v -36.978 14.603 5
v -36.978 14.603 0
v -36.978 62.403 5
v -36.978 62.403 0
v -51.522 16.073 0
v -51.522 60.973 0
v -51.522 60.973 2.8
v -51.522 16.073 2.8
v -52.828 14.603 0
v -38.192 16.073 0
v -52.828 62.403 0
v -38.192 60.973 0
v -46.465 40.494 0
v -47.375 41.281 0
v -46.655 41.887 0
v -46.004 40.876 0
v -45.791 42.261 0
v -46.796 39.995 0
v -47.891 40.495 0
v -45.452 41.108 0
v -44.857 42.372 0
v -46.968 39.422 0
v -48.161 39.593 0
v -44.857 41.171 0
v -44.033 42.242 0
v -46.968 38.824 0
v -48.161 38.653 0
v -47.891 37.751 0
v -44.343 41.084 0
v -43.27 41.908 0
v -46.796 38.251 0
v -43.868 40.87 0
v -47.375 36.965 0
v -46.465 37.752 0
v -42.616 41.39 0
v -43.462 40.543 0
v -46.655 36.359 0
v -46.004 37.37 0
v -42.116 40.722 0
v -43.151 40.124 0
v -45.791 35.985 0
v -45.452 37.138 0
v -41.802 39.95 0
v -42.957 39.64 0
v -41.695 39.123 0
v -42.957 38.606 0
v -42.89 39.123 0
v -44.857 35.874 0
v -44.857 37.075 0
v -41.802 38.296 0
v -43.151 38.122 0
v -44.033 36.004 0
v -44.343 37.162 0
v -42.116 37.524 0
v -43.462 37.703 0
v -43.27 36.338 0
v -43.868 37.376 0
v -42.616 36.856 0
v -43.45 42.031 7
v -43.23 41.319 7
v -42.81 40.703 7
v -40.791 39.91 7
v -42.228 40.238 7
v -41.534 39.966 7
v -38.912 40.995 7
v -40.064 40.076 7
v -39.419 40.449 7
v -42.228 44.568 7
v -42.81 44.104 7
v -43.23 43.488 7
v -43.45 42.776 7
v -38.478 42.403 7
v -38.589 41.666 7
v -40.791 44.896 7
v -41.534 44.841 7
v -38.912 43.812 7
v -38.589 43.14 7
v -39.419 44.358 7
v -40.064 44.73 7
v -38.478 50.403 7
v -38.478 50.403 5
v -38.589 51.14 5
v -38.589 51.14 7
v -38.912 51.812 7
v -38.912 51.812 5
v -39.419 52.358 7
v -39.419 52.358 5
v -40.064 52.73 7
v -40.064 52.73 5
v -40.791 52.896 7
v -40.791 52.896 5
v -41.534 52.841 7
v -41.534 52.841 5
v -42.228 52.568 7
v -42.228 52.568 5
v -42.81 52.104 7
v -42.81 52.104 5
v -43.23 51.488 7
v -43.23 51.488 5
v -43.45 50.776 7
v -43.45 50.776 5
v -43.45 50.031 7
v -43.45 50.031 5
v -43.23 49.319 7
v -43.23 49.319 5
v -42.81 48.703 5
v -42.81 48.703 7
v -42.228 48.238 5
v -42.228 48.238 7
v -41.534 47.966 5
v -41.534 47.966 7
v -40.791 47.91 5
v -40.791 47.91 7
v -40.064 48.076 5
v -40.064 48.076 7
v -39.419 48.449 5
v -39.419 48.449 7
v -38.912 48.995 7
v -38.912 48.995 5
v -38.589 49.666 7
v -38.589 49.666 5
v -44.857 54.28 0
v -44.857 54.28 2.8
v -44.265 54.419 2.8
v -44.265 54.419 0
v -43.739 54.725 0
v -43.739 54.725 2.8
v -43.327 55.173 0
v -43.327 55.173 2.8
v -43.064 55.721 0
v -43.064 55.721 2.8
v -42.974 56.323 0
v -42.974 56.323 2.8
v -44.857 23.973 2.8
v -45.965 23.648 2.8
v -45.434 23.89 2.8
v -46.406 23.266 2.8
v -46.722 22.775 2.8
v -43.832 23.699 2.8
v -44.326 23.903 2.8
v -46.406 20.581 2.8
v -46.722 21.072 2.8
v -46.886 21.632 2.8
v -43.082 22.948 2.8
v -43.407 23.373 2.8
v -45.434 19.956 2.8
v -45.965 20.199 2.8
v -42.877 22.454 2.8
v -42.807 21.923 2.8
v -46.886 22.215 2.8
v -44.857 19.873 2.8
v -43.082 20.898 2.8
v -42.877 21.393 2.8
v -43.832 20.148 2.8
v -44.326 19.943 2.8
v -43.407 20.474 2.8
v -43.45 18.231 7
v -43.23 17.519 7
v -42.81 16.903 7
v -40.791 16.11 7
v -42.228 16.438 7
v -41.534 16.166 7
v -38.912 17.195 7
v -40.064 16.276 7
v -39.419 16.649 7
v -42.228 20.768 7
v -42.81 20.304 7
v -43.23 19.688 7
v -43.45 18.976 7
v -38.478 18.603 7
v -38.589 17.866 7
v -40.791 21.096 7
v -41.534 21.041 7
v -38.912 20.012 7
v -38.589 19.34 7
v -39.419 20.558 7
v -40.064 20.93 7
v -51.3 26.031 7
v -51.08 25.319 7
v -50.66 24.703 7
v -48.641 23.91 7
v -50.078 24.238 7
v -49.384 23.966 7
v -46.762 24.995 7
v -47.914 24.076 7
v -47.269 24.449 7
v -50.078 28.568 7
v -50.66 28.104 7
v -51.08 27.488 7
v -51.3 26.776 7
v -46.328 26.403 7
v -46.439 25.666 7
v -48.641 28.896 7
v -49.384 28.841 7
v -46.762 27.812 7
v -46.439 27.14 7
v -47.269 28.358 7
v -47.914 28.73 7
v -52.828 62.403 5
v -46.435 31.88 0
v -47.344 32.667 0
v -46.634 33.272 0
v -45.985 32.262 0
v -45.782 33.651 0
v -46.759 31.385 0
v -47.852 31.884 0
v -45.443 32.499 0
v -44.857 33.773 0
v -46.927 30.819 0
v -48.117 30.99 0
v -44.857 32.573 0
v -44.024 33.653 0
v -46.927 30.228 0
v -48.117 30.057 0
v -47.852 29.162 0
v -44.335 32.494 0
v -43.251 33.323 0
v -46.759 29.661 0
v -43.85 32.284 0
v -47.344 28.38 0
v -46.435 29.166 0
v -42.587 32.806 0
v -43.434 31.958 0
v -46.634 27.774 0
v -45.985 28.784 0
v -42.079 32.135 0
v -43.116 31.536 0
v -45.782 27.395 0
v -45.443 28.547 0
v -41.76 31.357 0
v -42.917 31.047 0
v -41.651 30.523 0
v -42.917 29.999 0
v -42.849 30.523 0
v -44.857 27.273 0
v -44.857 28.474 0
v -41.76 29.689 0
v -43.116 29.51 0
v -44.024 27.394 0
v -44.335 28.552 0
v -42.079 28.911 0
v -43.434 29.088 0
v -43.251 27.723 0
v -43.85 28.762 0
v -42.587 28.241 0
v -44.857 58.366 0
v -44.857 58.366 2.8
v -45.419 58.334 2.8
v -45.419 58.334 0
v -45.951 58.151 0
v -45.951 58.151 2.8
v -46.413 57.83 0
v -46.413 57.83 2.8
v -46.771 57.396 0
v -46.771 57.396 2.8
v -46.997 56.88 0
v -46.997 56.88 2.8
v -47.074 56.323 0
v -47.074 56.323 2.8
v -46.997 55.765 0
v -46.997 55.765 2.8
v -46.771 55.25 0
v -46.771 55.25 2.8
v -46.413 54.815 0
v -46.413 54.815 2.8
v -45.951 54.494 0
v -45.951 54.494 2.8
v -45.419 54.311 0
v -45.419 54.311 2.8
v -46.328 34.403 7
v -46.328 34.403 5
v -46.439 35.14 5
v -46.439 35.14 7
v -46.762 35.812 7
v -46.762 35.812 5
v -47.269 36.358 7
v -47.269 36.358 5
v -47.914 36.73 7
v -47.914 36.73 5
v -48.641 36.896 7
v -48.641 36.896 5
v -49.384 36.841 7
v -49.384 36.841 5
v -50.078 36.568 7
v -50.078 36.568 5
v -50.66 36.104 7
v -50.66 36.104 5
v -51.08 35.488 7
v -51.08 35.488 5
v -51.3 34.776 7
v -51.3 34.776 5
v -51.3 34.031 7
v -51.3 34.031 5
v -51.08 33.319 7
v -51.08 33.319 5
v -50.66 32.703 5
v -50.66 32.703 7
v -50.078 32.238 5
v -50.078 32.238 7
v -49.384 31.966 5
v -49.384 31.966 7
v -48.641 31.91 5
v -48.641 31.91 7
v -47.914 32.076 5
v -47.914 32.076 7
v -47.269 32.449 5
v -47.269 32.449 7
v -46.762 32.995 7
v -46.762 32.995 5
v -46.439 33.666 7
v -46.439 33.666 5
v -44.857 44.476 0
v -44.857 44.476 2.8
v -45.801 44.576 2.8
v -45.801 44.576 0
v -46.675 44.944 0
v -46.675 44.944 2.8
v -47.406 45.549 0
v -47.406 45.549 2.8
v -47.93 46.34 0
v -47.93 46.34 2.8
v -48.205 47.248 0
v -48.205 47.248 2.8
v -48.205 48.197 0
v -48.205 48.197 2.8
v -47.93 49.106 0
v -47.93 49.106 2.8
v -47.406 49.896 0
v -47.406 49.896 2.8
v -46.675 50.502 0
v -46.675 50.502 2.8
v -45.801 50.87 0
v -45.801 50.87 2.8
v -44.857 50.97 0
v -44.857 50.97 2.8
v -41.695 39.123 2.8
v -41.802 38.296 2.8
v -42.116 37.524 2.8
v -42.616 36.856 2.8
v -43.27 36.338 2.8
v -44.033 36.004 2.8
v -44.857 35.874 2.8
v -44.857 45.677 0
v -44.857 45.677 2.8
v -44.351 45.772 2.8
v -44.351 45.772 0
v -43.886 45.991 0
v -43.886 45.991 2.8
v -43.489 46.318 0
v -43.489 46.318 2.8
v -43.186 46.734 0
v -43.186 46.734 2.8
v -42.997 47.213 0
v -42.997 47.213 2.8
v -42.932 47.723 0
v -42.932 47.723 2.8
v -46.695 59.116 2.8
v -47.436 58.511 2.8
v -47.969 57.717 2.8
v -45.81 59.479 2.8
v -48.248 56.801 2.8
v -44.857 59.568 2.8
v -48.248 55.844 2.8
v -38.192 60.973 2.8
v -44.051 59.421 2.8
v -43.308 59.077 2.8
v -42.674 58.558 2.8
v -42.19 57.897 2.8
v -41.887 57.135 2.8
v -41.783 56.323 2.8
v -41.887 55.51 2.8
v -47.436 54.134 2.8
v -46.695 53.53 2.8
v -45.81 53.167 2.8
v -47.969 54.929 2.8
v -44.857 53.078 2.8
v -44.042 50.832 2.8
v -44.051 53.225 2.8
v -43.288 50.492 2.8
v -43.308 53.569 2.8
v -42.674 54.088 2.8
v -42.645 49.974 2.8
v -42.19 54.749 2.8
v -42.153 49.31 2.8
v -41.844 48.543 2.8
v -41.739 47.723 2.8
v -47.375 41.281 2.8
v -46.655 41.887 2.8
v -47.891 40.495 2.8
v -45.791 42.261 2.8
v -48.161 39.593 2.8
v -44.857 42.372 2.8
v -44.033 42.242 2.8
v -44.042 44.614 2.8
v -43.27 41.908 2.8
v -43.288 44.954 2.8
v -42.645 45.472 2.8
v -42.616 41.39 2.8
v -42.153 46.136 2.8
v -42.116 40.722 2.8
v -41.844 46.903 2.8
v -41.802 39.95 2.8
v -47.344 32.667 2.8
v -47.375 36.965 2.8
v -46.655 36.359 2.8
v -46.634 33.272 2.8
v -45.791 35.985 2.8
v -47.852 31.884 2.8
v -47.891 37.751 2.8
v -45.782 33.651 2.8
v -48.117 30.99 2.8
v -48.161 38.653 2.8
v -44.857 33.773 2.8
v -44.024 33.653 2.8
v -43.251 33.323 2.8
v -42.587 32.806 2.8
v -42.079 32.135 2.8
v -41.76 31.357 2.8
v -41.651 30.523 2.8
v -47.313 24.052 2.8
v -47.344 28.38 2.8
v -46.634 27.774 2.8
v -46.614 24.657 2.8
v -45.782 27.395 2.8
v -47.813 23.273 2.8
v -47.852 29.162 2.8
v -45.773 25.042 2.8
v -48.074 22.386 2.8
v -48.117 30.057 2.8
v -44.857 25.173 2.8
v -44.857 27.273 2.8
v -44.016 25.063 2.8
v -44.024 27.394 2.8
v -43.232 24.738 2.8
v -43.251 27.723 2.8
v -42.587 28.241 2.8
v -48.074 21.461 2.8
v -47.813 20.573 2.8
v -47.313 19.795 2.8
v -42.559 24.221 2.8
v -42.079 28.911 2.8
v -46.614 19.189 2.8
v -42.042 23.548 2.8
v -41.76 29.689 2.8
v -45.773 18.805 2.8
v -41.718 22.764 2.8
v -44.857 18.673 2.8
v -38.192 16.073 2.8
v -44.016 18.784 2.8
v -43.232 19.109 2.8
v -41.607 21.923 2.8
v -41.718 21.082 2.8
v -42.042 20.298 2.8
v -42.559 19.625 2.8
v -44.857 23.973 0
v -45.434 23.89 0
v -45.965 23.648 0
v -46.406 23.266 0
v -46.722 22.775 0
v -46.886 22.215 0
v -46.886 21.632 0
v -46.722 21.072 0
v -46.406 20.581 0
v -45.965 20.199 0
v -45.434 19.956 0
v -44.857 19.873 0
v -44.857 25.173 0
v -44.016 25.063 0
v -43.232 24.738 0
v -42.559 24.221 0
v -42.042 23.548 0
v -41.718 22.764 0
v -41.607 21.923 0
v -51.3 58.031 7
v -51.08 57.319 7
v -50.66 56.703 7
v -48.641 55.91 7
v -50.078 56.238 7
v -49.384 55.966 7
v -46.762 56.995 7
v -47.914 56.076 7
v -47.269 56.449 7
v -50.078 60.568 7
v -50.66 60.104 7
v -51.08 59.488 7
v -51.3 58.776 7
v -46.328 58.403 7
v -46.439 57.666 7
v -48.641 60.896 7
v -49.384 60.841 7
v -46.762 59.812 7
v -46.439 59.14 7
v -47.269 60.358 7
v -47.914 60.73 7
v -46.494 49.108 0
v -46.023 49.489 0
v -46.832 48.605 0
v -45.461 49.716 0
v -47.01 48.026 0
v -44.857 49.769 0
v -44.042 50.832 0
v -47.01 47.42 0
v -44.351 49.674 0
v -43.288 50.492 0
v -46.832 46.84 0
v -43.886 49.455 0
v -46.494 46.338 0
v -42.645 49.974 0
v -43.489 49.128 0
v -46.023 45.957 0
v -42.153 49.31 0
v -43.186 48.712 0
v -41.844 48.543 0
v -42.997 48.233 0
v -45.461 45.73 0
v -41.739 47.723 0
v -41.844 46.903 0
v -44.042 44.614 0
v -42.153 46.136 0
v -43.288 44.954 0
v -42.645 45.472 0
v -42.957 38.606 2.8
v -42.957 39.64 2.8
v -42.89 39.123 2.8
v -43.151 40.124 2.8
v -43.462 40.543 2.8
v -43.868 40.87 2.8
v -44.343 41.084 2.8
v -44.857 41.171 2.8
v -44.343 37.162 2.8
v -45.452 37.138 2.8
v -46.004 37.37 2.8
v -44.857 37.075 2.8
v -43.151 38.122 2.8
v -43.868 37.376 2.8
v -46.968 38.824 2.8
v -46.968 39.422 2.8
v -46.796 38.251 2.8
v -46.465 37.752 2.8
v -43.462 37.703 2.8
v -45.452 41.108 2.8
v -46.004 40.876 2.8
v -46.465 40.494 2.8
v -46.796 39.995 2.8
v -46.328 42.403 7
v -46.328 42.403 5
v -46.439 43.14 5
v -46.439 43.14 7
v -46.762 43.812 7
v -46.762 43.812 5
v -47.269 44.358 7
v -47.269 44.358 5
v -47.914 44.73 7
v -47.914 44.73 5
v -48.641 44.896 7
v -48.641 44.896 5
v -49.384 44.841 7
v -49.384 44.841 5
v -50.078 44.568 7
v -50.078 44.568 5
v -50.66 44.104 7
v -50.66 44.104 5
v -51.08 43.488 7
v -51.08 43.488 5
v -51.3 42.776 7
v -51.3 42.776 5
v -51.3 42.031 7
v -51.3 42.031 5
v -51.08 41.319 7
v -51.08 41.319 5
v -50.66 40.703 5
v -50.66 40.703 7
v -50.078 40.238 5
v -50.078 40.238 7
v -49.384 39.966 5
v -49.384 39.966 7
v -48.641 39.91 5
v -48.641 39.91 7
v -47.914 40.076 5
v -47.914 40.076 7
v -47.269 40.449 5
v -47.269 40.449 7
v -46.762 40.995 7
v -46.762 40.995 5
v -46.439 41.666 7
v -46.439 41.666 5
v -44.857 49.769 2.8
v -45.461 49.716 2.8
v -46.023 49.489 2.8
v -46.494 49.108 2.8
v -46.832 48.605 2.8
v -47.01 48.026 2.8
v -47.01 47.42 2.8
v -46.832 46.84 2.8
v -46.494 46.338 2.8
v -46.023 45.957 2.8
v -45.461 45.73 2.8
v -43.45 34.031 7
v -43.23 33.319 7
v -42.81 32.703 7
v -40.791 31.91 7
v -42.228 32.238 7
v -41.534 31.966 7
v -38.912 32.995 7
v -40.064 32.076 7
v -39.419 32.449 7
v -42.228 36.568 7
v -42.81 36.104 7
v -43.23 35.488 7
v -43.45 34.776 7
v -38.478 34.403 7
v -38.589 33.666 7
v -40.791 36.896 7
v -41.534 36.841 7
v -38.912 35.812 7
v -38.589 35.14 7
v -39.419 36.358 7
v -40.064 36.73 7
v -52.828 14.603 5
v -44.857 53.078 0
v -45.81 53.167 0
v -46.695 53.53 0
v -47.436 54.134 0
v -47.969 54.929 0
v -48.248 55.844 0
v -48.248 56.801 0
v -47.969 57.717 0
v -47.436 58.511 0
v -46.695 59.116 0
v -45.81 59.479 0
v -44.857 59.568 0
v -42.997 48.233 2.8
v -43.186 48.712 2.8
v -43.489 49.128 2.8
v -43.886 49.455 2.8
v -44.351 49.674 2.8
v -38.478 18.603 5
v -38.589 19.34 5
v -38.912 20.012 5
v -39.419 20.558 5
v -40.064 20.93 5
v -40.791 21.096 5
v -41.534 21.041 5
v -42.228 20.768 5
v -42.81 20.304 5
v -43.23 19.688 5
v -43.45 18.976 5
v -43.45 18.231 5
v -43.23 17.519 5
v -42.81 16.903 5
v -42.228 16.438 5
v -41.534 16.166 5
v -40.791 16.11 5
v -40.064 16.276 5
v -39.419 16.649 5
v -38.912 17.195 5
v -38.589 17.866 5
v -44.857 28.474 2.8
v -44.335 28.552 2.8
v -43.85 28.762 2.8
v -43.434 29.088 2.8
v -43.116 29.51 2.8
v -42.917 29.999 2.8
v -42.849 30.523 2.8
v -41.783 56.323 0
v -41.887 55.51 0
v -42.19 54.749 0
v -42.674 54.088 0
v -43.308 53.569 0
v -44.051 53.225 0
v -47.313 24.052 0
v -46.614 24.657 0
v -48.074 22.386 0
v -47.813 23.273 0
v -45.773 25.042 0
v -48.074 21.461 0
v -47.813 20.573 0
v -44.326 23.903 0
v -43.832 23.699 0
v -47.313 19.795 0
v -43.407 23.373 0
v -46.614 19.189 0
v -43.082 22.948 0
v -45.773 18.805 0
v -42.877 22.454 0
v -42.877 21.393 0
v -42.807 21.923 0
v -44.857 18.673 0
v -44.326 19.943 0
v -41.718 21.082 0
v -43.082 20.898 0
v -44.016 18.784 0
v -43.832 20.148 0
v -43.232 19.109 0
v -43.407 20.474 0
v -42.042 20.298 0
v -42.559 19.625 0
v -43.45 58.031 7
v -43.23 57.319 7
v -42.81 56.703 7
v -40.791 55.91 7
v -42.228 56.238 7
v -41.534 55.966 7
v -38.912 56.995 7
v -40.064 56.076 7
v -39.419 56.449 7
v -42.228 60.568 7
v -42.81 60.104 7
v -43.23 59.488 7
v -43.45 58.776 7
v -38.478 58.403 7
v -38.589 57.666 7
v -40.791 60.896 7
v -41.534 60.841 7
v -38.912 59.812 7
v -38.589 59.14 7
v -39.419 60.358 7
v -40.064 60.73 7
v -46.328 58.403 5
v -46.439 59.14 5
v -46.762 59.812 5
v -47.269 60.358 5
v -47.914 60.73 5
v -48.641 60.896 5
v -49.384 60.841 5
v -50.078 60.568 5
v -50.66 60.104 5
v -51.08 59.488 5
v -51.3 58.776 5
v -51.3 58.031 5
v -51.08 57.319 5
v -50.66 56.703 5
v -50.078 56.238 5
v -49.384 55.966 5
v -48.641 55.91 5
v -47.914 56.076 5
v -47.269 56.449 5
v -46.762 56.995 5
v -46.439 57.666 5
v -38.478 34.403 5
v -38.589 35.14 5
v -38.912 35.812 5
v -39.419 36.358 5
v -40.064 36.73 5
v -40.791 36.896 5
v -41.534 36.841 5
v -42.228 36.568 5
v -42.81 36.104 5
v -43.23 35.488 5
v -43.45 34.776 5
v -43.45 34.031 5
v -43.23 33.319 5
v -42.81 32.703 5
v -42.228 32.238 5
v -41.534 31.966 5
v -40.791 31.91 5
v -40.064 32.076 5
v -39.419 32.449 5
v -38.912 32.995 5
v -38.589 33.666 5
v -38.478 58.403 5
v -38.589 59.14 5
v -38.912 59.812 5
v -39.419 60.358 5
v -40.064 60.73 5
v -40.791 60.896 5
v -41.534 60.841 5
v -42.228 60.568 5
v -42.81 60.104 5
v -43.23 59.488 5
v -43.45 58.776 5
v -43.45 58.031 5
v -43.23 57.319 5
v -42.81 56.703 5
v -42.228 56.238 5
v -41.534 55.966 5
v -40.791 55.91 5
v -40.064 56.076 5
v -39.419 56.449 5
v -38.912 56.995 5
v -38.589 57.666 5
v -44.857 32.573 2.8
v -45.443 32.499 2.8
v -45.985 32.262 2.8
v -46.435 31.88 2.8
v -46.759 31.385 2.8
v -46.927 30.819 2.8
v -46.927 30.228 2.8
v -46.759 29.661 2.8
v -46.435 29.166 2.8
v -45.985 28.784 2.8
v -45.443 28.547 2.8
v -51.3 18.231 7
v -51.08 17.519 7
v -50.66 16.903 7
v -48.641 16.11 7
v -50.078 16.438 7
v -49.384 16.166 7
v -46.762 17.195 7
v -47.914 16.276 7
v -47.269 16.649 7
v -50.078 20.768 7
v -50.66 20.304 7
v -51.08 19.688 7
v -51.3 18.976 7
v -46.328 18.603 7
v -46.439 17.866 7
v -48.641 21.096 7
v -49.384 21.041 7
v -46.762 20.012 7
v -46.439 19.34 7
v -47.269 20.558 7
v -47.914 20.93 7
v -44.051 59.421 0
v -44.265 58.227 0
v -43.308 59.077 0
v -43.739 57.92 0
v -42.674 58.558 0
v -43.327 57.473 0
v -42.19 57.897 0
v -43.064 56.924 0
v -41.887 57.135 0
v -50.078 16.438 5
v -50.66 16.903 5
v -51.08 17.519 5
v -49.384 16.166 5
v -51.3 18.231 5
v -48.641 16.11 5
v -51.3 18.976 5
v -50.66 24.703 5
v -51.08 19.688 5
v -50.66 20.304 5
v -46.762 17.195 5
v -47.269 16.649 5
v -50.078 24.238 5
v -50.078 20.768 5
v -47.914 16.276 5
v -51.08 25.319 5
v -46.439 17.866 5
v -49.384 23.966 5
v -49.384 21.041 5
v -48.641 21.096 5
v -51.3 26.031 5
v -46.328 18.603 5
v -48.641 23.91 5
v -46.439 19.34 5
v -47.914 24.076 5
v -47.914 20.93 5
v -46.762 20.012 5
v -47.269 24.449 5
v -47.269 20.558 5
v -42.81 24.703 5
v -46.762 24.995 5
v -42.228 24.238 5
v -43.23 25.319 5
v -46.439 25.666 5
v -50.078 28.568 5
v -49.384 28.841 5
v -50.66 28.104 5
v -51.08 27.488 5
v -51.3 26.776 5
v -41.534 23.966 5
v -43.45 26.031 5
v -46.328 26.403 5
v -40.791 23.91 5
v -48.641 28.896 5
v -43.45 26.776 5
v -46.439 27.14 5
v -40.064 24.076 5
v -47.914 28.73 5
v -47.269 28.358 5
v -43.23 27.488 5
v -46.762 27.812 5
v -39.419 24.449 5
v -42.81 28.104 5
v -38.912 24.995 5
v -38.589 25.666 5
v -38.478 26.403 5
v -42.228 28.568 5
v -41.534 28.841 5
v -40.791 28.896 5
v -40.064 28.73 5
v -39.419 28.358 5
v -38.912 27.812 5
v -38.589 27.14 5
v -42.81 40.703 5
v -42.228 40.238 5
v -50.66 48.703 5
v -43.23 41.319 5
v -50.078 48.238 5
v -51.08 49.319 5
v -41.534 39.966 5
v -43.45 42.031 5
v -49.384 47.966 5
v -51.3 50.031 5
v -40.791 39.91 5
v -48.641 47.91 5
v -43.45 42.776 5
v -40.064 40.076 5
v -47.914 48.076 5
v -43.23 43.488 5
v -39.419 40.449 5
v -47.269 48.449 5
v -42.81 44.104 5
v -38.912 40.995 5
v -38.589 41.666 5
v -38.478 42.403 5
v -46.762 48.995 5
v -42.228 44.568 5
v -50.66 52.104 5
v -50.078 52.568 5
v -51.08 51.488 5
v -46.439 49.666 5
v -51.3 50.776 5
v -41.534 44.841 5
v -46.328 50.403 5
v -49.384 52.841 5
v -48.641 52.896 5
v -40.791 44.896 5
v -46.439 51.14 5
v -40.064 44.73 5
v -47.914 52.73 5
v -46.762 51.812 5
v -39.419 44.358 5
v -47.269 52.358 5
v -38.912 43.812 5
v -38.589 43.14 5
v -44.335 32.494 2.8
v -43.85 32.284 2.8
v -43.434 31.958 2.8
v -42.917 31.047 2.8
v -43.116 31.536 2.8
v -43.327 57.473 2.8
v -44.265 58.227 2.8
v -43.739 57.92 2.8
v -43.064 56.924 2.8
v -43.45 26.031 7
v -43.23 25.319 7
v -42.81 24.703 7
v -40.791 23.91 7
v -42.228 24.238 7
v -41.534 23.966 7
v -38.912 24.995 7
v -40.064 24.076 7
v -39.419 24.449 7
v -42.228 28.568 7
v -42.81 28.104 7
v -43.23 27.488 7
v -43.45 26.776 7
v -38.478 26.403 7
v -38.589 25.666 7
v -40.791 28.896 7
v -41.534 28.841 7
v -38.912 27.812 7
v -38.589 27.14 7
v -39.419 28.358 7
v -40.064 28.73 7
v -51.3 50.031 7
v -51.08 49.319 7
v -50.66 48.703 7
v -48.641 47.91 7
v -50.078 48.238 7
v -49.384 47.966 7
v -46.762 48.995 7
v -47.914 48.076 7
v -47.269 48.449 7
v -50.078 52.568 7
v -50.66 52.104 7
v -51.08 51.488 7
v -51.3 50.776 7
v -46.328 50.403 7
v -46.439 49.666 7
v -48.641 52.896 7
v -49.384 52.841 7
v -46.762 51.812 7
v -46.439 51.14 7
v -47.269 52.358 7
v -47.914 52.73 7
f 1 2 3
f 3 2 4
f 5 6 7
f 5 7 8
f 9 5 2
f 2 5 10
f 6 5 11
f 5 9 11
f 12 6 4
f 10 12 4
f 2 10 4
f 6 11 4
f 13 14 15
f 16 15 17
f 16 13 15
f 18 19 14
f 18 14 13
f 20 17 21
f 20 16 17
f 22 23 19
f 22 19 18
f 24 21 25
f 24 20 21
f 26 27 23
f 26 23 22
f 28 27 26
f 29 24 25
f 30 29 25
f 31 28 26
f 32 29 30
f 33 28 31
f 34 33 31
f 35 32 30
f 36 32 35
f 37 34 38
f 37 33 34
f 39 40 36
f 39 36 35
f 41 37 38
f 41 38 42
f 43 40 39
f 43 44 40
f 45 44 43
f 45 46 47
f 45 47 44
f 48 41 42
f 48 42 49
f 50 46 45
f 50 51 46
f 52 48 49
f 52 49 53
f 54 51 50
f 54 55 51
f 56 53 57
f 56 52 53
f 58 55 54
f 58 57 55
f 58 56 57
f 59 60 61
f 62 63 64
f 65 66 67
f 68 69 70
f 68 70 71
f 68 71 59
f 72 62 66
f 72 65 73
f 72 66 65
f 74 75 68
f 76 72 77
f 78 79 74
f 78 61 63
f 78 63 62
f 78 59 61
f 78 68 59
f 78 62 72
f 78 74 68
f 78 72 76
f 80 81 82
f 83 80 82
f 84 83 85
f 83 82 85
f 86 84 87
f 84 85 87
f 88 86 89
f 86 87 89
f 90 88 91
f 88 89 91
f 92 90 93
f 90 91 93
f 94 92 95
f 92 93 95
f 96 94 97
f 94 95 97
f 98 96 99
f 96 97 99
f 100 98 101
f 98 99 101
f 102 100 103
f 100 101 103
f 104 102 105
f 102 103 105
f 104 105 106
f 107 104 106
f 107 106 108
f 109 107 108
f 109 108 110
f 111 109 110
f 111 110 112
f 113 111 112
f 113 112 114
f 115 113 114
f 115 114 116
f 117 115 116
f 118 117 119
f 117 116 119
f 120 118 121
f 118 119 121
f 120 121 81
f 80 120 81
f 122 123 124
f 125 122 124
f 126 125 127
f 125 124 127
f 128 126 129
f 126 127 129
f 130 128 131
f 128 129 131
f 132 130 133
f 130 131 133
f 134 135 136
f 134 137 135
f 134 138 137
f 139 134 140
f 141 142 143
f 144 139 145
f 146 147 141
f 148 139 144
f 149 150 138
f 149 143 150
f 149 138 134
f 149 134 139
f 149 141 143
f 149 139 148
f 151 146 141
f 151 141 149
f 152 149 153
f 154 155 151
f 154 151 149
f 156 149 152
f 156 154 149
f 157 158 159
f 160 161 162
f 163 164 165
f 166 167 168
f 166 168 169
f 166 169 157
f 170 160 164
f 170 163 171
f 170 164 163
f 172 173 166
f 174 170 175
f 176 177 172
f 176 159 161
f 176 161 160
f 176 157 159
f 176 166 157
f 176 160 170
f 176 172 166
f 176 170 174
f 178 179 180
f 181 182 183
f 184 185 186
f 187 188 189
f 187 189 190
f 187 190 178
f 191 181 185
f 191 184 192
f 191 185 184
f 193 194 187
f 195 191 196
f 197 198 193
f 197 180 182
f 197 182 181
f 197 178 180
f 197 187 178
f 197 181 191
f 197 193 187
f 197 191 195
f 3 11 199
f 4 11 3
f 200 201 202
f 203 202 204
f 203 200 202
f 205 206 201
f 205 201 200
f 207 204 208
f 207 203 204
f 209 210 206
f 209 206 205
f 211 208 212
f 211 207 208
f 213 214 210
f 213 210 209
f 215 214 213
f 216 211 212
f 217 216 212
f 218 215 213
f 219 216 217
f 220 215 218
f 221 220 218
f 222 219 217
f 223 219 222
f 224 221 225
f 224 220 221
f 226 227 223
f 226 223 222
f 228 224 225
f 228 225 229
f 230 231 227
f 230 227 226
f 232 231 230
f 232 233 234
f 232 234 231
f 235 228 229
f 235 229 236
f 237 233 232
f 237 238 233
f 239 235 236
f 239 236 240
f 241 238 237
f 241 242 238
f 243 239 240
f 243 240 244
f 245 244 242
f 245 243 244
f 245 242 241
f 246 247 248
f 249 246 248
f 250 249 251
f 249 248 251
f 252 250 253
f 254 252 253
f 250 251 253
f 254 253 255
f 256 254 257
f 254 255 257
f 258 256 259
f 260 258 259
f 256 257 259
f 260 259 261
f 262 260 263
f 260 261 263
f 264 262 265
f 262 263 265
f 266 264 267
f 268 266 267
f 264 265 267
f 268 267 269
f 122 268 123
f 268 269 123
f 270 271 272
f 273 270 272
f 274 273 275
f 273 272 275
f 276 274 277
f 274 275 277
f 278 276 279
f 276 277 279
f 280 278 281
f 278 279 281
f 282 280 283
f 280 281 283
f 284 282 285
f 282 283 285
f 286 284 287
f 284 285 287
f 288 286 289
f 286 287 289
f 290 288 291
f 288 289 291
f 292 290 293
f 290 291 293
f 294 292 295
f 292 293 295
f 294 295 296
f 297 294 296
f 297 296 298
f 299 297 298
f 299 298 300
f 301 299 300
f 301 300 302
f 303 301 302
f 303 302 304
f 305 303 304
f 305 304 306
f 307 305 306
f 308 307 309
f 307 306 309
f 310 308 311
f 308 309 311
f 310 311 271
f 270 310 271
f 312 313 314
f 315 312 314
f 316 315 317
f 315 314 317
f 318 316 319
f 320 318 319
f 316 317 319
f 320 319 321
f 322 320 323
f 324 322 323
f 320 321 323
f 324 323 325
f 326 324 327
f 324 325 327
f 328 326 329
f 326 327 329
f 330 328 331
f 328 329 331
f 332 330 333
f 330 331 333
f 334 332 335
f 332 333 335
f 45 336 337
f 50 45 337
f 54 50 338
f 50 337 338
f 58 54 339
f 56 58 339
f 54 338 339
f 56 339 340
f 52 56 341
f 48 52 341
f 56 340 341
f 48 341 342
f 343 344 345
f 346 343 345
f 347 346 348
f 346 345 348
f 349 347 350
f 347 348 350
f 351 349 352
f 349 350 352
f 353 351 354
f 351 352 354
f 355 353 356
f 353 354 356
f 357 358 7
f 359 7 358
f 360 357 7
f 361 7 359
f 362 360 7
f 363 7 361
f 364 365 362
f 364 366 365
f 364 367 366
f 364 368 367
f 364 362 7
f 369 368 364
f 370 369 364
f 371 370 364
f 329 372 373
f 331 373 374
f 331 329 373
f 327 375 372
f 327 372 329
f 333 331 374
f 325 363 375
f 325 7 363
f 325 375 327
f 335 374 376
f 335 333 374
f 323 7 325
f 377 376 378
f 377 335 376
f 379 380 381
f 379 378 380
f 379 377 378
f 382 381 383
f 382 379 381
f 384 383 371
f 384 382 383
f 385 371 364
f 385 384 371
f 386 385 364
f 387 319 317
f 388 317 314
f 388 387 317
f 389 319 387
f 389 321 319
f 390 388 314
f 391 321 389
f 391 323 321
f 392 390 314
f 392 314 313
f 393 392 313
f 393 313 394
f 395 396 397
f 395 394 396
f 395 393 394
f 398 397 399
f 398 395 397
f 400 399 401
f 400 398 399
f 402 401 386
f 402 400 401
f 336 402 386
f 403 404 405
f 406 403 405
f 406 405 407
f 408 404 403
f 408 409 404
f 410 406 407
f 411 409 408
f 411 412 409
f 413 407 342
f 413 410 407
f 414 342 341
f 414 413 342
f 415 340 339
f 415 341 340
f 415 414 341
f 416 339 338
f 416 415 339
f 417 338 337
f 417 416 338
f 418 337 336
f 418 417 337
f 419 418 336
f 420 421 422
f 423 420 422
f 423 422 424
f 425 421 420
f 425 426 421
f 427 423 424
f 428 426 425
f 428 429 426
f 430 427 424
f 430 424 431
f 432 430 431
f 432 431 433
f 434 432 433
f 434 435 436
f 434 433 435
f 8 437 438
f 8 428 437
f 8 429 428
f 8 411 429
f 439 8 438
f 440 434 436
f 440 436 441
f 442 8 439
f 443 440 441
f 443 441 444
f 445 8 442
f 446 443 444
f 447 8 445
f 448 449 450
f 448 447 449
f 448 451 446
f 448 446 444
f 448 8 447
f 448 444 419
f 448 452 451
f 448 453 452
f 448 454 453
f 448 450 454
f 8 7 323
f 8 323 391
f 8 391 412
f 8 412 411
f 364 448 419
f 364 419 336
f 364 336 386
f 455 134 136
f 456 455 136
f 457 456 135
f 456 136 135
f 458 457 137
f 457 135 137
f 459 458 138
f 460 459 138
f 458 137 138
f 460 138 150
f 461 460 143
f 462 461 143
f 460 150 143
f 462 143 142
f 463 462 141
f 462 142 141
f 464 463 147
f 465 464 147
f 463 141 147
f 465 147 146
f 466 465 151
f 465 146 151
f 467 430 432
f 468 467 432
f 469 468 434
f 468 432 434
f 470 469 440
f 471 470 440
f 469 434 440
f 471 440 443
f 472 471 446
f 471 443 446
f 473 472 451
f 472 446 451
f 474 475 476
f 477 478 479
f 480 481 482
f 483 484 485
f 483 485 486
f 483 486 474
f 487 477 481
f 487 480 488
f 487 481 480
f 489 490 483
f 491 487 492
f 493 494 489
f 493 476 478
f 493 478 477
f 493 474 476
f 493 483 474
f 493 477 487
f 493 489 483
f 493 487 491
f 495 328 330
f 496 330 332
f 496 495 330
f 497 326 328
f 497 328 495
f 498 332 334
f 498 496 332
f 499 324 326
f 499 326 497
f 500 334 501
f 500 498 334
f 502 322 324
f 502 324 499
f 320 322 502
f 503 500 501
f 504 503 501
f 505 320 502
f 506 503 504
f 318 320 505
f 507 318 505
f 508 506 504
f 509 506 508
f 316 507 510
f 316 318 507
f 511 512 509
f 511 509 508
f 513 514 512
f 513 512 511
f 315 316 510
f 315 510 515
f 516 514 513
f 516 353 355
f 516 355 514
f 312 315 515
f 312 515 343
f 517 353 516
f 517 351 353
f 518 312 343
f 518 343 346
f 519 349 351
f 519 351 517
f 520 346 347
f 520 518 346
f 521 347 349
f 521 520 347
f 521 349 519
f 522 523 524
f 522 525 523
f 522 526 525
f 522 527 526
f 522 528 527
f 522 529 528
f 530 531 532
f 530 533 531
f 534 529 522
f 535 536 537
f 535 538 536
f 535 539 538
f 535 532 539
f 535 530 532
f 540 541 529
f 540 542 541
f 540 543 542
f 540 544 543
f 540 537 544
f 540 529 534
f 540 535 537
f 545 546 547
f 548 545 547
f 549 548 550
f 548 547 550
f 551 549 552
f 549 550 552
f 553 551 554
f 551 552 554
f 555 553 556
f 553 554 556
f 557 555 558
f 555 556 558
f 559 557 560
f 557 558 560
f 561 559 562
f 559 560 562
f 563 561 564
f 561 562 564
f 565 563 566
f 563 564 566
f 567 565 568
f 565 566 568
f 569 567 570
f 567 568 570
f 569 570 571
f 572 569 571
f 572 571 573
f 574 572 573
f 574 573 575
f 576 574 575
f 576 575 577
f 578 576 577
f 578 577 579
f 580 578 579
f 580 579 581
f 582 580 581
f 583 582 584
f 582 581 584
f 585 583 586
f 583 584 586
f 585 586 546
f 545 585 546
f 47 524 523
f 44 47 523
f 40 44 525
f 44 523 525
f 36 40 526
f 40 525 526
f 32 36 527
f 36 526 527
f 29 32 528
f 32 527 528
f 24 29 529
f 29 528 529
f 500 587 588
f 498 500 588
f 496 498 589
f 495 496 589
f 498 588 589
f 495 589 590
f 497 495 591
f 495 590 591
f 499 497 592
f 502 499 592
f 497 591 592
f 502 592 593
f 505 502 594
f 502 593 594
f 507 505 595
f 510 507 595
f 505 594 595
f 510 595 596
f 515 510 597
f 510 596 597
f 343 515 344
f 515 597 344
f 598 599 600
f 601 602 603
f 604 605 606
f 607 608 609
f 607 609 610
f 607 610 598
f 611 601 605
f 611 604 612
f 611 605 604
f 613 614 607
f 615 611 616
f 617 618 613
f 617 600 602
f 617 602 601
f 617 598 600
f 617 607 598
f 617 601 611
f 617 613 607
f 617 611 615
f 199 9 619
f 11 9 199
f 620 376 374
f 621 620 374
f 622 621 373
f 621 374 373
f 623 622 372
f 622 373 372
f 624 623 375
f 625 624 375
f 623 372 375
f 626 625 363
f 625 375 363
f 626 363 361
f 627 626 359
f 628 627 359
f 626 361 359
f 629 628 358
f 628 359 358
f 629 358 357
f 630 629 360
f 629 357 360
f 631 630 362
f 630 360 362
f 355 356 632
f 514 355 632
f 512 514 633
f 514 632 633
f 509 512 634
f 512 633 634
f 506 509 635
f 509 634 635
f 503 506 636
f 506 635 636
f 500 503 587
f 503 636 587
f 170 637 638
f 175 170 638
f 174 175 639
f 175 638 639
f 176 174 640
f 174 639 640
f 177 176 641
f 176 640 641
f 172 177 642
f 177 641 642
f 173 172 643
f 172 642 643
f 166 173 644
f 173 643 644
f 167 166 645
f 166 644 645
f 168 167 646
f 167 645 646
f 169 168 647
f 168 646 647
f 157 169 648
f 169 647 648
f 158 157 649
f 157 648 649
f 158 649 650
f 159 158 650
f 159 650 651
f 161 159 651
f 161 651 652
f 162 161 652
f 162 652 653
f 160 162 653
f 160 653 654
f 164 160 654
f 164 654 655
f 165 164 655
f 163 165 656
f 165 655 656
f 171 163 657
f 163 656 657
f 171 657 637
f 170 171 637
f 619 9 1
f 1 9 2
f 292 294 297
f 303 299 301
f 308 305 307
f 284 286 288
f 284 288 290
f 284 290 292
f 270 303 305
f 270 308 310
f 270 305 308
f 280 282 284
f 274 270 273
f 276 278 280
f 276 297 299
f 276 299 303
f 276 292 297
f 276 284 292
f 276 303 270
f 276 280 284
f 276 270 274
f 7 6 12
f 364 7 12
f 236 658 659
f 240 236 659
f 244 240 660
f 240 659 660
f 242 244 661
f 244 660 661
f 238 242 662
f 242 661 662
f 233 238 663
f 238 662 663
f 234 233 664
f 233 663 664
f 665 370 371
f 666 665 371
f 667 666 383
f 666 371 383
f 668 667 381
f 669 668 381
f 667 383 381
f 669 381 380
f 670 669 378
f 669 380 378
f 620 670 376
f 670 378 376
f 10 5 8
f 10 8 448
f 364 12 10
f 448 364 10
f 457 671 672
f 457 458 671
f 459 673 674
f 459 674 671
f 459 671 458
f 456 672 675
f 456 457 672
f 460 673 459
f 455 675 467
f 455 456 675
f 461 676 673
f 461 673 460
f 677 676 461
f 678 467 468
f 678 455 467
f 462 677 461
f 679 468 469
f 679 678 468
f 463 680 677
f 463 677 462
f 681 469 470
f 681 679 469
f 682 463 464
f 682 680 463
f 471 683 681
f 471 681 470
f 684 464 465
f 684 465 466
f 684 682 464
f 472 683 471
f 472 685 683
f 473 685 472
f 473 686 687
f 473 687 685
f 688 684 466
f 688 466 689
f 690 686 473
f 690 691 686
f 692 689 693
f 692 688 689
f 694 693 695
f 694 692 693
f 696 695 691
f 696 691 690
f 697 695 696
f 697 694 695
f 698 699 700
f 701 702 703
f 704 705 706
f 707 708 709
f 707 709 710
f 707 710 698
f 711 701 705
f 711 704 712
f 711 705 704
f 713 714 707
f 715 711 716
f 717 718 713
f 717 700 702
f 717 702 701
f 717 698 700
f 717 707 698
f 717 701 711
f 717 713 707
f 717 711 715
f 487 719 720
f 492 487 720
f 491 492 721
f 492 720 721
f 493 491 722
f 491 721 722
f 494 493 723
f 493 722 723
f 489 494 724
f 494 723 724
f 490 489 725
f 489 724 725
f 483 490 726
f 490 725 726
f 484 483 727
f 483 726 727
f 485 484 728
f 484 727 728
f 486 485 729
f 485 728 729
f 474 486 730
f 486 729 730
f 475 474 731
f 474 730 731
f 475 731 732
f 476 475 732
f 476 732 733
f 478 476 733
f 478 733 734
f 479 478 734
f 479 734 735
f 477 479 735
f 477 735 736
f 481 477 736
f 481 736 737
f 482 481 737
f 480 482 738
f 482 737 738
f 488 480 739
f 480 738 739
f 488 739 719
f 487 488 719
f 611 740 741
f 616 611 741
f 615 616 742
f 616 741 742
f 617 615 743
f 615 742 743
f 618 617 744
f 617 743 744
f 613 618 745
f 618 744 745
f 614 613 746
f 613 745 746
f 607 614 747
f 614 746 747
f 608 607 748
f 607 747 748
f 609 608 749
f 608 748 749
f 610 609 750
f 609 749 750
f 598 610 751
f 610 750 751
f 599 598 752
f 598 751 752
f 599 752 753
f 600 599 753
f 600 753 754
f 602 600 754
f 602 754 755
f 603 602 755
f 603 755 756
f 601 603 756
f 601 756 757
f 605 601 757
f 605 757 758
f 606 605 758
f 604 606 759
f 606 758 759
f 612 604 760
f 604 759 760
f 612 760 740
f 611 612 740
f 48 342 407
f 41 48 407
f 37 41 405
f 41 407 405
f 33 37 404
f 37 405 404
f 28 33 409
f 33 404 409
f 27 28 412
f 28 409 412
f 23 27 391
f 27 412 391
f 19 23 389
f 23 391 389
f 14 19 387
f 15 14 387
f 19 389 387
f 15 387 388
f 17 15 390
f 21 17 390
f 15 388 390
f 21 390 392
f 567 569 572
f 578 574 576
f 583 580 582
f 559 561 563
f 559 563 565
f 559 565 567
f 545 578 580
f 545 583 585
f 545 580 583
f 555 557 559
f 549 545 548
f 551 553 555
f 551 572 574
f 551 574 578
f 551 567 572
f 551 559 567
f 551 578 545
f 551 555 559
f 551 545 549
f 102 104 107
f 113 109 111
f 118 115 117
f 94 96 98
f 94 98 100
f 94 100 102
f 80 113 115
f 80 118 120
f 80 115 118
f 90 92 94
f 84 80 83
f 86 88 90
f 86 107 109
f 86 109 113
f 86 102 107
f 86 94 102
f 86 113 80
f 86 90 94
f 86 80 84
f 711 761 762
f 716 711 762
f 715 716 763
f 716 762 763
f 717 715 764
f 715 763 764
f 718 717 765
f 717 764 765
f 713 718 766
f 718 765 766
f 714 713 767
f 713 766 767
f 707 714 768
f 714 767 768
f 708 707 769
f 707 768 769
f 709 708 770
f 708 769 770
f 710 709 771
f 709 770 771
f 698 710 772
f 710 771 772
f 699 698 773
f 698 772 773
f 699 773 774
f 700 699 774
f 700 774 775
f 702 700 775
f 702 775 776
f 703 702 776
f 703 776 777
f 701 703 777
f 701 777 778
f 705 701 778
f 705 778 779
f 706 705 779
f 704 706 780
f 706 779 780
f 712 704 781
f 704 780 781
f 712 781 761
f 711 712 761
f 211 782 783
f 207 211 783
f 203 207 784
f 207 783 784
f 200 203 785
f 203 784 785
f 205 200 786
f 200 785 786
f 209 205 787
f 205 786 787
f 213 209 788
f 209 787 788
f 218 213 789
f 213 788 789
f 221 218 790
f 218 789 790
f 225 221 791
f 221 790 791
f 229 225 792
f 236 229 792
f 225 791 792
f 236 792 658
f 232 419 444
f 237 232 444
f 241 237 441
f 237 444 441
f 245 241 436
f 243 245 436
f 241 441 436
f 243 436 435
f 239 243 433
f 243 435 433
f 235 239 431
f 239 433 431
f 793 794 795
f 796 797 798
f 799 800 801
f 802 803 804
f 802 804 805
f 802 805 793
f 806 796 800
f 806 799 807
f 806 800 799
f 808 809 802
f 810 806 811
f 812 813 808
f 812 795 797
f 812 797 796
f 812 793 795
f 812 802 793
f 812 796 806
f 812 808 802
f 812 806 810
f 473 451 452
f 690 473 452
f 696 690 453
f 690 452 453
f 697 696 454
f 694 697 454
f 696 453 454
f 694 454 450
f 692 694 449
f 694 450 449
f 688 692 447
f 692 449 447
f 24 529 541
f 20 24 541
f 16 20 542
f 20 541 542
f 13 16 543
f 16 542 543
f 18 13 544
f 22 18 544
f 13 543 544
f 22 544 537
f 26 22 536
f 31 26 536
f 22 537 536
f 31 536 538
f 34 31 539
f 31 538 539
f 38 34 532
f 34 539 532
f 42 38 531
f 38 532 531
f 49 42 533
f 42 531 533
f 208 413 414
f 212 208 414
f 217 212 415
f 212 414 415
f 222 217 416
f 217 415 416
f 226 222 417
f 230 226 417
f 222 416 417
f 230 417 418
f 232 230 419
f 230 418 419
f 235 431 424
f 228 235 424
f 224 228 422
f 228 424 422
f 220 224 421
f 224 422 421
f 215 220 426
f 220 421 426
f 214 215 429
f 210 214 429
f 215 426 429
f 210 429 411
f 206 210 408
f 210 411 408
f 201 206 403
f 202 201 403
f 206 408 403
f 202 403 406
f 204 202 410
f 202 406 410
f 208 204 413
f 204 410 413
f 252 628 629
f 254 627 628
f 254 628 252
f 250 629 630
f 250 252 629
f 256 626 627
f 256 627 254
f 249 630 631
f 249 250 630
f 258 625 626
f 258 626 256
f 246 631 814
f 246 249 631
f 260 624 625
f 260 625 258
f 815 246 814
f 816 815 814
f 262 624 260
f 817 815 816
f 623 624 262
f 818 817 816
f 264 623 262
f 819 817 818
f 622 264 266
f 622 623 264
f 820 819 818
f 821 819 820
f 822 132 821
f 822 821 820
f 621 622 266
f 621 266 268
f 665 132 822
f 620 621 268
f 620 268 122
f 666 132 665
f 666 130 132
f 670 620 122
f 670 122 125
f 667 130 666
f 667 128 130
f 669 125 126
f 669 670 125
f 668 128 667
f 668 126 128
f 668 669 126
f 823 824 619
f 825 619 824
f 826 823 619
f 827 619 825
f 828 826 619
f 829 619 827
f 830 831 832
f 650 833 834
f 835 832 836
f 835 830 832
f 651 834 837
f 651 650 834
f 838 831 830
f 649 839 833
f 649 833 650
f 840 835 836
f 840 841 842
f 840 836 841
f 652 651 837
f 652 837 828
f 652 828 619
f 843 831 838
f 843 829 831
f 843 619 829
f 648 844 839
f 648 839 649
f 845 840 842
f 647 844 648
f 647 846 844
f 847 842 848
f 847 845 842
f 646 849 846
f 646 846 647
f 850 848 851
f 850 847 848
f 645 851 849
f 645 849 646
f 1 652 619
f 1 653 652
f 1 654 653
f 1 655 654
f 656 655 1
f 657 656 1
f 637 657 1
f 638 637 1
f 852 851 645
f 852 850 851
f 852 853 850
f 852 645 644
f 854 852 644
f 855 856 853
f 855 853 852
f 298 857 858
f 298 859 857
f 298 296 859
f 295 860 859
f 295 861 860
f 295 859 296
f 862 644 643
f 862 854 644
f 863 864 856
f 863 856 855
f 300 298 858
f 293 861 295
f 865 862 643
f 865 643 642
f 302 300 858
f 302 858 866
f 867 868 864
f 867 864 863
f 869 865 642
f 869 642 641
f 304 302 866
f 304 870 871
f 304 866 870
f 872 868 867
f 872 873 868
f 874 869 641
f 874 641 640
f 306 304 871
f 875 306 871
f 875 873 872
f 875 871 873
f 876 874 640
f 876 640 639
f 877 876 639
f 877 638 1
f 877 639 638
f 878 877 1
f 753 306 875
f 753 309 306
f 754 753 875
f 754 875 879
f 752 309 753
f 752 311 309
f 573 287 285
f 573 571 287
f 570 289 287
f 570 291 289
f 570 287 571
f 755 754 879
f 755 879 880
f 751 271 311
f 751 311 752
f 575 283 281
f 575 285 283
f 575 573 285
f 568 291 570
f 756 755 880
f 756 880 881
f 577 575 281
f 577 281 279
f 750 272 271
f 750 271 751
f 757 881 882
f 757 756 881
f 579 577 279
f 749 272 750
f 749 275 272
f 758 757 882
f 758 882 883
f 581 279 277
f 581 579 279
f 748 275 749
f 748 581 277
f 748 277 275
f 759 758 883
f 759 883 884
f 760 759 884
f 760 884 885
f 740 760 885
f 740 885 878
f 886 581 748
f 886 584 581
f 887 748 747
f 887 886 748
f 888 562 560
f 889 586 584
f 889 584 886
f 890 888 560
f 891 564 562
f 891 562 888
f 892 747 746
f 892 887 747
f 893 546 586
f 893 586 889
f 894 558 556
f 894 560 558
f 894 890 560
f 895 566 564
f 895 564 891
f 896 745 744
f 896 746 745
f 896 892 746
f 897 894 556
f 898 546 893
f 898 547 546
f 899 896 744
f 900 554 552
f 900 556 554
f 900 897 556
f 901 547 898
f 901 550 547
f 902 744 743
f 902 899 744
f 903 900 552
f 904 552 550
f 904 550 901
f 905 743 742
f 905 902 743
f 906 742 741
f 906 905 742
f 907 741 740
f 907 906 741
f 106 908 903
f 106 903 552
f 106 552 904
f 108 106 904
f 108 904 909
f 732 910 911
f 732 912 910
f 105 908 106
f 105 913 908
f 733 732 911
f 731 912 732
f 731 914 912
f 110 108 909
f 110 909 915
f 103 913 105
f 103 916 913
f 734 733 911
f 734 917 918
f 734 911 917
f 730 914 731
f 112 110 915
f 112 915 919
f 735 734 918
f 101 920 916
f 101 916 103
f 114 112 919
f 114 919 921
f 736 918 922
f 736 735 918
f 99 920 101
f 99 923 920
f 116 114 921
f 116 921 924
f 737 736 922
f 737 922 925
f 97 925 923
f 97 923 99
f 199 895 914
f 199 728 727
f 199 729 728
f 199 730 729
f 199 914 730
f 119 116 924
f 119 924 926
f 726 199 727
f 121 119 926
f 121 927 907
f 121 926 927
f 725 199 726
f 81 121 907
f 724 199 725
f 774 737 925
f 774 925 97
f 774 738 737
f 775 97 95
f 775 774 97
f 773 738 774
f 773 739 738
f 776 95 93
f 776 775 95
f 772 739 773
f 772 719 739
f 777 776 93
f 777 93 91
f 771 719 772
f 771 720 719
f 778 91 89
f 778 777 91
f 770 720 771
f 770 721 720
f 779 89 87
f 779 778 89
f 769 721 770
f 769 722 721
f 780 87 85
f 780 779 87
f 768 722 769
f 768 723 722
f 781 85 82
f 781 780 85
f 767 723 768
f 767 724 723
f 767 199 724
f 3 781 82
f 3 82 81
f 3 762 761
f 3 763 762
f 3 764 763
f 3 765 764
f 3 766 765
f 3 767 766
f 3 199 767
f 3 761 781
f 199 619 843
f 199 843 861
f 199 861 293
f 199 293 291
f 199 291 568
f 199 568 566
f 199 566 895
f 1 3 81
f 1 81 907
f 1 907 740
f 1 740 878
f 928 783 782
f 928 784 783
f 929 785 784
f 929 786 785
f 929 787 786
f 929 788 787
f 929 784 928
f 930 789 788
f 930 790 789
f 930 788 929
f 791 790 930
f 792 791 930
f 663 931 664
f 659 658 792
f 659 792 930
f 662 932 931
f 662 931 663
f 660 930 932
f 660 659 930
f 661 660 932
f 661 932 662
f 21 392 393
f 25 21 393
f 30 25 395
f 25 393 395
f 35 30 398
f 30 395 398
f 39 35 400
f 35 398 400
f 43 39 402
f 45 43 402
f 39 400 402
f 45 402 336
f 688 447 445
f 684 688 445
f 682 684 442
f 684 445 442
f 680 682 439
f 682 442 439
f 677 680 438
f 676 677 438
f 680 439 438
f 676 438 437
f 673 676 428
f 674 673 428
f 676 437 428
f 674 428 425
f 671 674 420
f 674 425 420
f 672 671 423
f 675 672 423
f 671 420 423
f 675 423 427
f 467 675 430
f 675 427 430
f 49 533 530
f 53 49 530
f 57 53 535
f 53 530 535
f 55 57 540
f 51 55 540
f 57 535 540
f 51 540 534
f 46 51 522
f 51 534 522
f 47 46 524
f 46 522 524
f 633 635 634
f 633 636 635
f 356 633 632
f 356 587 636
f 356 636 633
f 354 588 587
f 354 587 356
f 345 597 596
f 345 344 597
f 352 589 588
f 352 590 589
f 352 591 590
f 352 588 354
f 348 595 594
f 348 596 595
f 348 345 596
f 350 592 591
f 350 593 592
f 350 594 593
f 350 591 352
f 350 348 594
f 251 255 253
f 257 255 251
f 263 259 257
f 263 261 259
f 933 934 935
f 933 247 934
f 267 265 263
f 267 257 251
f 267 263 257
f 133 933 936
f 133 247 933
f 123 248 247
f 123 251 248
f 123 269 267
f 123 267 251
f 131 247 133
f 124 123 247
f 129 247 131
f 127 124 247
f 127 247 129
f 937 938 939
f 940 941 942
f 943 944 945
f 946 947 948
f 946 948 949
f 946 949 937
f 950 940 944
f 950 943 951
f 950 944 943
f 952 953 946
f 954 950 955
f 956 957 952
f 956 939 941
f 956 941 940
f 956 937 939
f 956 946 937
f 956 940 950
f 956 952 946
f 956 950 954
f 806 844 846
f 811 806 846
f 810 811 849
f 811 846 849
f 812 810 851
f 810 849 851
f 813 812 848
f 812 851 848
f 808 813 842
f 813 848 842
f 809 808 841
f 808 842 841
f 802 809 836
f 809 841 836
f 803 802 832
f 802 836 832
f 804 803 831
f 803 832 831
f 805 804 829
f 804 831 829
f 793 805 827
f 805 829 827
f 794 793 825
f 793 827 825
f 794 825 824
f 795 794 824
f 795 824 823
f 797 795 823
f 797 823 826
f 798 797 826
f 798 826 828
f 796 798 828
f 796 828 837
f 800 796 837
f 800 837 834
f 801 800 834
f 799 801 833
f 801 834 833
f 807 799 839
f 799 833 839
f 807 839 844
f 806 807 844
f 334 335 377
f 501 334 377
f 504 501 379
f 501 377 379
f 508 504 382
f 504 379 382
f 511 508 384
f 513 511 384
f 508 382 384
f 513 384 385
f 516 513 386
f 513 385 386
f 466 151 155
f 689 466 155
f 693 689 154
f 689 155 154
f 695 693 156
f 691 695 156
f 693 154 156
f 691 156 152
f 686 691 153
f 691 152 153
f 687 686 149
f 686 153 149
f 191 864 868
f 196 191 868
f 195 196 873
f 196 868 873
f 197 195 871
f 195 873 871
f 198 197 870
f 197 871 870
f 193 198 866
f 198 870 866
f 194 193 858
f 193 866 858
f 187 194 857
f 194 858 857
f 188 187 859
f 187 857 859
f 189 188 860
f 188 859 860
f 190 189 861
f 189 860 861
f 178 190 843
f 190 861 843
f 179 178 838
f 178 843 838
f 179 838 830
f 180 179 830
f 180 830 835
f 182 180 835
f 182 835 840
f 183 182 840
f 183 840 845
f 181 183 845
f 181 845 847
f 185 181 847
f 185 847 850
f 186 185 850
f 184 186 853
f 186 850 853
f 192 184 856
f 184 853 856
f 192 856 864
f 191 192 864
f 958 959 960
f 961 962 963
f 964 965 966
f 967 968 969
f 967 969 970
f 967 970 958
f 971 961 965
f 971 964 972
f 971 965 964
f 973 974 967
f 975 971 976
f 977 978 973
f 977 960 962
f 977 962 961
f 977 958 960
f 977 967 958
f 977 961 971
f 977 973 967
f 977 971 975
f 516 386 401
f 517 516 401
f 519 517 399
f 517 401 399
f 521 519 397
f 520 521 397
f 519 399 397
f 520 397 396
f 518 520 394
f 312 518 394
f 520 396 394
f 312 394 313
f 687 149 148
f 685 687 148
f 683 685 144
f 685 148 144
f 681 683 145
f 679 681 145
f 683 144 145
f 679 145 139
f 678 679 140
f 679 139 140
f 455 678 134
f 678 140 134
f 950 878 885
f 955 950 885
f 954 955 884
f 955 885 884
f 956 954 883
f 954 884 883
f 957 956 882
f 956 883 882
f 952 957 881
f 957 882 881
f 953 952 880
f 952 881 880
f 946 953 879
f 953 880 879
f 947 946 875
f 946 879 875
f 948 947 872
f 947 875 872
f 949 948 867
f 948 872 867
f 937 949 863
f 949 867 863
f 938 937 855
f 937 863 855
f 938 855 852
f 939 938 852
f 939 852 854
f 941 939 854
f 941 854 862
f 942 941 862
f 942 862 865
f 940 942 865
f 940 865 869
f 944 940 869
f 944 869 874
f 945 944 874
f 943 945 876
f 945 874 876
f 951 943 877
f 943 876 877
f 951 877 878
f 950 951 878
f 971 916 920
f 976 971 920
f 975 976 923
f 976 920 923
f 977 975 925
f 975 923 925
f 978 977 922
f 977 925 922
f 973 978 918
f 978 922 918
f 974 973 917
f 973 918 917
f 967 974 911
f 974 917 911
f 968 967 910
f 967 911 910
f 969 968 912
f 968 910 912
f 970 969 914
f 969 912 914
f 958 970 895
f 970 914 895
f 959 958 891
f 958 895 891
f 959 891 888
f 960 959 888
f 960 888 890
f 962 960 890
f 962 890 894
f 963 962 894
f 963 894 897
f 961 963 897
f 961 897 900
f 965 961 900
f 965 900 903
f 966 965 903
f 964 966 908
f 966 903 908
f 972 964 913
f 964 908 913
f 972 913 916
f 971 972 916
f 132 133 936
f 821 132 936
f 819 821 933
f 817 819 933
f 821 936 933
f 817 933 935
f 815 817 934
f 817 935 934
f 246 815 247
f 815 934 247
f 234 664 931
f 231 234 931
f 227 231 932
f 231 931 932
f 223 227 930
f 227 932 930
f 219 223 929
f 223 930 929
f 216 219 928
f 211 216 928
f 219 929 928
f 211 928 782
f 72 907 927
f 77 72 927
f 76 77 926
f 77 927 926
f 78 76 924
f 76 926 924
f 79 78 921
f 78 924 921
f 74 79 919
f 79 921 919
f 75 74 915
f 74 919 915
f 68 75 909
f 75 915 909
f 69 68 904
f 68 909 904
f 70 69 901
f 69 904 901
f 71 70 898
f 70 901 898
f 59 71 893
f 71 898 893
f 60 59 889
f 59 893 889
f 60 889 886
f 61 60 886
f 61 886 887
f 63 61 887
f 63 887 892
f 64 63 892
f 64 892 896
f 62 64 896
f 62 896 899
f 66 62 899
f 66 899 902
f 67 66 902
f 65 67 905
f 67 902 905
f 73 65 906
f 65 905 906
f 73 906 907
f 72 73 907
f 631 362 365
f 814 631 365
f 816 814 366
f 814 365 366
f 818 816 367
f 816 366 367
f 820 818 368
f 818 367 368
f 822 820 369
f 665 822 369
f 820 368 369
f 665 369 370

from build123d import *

# Parameters (mm, degrees)
F0_W     = 15.85
F0_H     = 47.8
F1_DEPTH = 5
F2_R     = 2.5
F3_DEPTH = 2
F4_W     = 13.33
F4_H     = 44.9
F5_DEPTH = 2.8
F7_DEPTH = 2.8


with BuildPart() as f1:
    # F0 (on Top) → F1 (new body)
    with BuildSketch(Plane.XY):
        with Locations((-44.90279, 38.503254)):
            Rectangle(F0_W, F0_H)
    extrude(amount=F1_DEPTH)

    # F2 (on face) → F3 (join)
    with BuildSketch(Plane.XY.offset(5)):
        with Locations((-48.82779, 58.403254)):
            Circle(F2_R)
        with Locations((-40.97779, 58.403254)):
            Circle(F2_R)
        with Locations((-48.82779, 18.603254)):
            Circle(F2_R)
        with Locations((-40.97779, 18.603254)):
            Circle(F2_R)
        with Locations((-48.82779, 50.403254)):
            Circle(F2_R)
        with Locations((-40.97779, 50.403254)):
            Circle(F2_R)
        with Locations((-48.82779, 26.403254)):
            Circle(F2_R)
        with Locations((-40.97779, 26.403254)):
            Circle(F2_R)
        with Locations((-48.82779, 42.403254)):
            Circle(F2_R)
        with Locations((-40.97779, 42.403254)):
            Circle(F2_R)
        with Locations((-48.82779, 34.403254)):
            Circle(F2_R)
        with Locations((-40.97779, 34.403254)):
            Circle(F2_R)
    extrude(amount=F3_DEPTH)

    # F4 (on face) → F5 (cut)
    with BuildSketch(Plane(origin=(0, 0, 0), x_dir=(1, 0, 0), z_dir=(0, 0, -1))):
        with Locations((-44.856941, -38.523254)):
            Rectangle(F4_W, F4_H)
    extrude(amount=-F5_DEPTH, mode=Mode.SUBTRACT)

    # F6 (on face) → F7 (join)
    with BuildSketch(Plane(origin=(0, 0, 2.8), x_dir=(1, 0, 0), z_dir=(0, 0, -1))):
        with BuildLine():
            ThreePointArc((-41.606941, -21.923254), (-42.558844, -19.625157), (-44.856941, -18.673254))
            Line((-44.856941, -18.673254), (-44.856941, -19.873254))
            ThreePointArc((-44.856941, -19.873254), (-43.407372, -20.473685), (-42.806941, -21.923254))
            ThreePointArc((-42.806941, -21.923254), (-43.407372, -23.372823), (-44.856941, -23.973254))
            Line((-44.856941, -23.973254), (-44.856941, -25.173254))
            ThreePointArc((-44.856941, -25.173254), (-42.558844, -24.221351), (-41.606941, -21.923254))
        make_face()
        with BuildLine():
            ThreePointArc((-41.783448, -56.322801), (-42.673771, -54.08798), (-44.856941, -53.077598))
            Line((-44.856941, -53.077598), (-44.856941, -54.279652))
            ThreePointArc((-44.856941, -54.279652), (-43.516394, -54.933528), (-42.973804, -56.32285))
            ThreePointArc((-42.973804, -56.32285), (-43.516394, -57.712172), (-44.856941, -58.366047))
            Line((-44.856941, -58.366047), (-44.856941, -59.568005))
            ThreePointArc((-44.856941, -59.568005), (-42.673771, -58.557623), (-41.783448, -56.322801))
        make_face()
        with BuildLine():
            Line((-44.856941, -54.279652), (-44.856941, -53.077598))
            ThreePointArc((-44.856941, -53.077598), (-48.283448, -56.322801), (-44.856941, -59.568005))
            Line((-44.856941, -59.568005), (-44.856941, -58.366047))
            ThreePointArc((-44.856941, -58.366047), (-47.073804, -56.32285), (-44.856941, -54.279652))
        make_face()
        with BuildLine():
            ThreePointArc((-41.739321, -47.722915), (-42.644888, -45.472108), (-44.856941, -44.475612))
            Line((-44.856941, -44.475612), (-44.856941, -45.676774))
            ThreePointArc((-44.856941, -45.676774), (-43.488929, -46.318325), (-42.932089, -47.722951))
            ThreePointArc((-42.932089, -47.722951), (-43.488929, -49.127577), (-44.856941, -49.769127))
            Line((-44.856941, -49.769127), (-44.856941, -50.970217))
            ThreePointArc((-44.856941, -50.970217), (-42.644888, -49.973722), (-41.739321, -47.722915))
        make_face()
        with BuildLine():
            Line((-44.856941, -45.676774), (-44.856941, -44.475612))
            ThreePointArc((-44.856941, -44.475612), (-48.239321, -47.722915), (-44.856941, -50.970217))
            Line((-44.856941, -50.970217), (-44.856941, -49.769127))
            ThreePointArc((-44.856941, -49.769127), (-47.032089, -47.722951), (-44.856941, -45.676774))
        make_face()
        with BuildLine():
            ThreePointArc((-41.695195, -39.123028), (-42.616104, -36.856348), (-44.856941, -35.874226))
            Line((-44.856941, -35.874226), (-44.856941, -37.07475))
            ThreePointArc((-44.856941, -37.07475), (-43.461601, -37.703287), (-42.890373, -39.123052))
            ThreePointArc((-42.890373, -39.123052), (-43.461601, -40.542817), (-44.856941, -41.171353))
            Line((-44.856941, -41.171353), (-44.856941, -42.371829))
            ThreePointArc((-44.856941, -42.371829), (-42.616104, -41.389708), (-41.695195, -39.123028))
        make_face()
        with BuildLine():
            Line((-44.856941, -37.07475), (-44.856941, -35.874226))
            ThreePointArc((-44.856941, -35.874226), (-48.195195, -39.123028), (-44.856941, -42.371829))
            Line((-44.856941, -42.371829), (-44.856941, -41.171353))
            ThreePointArc((-44.856941, -41.171353), (-46.990373, -39.123052), (-44.856941, -37.07475))
        make_face()
        with BuildLine():
            ThreePointArc((-41.651068, -30.523141), (-42.587422, -28.240698), (-44.856941, -27.273441))
            Line((-44.856941, -27.273441), (-44.856941, -28.473578))
            ThreePointArc((-44.856941, -28.473578), (-43.434414, -29.088409), (-42.848657, -30.523153))
            ThreePointArc((-42.848657, -30.523153), (-43.434414, -31.957897), (-44.856941, -32.572729))
            Line((-44.856941, -32.572729), (-44.856941, -33.772842))
            ThreePointArc((-44.856941, -33.772842), (-42.587422, -32.805584), (-41.651068, -30.523141))
        make_face()
        with BuildLine():
            Line((-44.856941, -28.473578), (-44.856941, -27.273441))
            ThreePointArc((-44.856941, -27.273441), (-48.151068, -30.523141), (-44.856941, -33.772842))
            Line((-44.856941, -33.772842), (-44.856941, -32.572729))
            ThreePointArc((-44.856941, -32.572729), (-46.948657, -30.523153), (-44.856941, -28.473578))
        make_face()
        with BuildLine():
            Line((-44.856941, -19.873254), (-44.856941, -18.673254))
            ThreePointArc((-44.856941, -18.673254), (-48.106941, -21.923254), (-44.856941, -25.173254))
            Line((-44.856941, -25.173254), (-44.856941, -23.973254))
            ThreePointArc((-44.856941, -23.973254), (-46.906941, -21.923254), (-44.856941, -19.873254))
        make_face()
    extrude(amount=F7_DEPTH)


solid = f1.part
